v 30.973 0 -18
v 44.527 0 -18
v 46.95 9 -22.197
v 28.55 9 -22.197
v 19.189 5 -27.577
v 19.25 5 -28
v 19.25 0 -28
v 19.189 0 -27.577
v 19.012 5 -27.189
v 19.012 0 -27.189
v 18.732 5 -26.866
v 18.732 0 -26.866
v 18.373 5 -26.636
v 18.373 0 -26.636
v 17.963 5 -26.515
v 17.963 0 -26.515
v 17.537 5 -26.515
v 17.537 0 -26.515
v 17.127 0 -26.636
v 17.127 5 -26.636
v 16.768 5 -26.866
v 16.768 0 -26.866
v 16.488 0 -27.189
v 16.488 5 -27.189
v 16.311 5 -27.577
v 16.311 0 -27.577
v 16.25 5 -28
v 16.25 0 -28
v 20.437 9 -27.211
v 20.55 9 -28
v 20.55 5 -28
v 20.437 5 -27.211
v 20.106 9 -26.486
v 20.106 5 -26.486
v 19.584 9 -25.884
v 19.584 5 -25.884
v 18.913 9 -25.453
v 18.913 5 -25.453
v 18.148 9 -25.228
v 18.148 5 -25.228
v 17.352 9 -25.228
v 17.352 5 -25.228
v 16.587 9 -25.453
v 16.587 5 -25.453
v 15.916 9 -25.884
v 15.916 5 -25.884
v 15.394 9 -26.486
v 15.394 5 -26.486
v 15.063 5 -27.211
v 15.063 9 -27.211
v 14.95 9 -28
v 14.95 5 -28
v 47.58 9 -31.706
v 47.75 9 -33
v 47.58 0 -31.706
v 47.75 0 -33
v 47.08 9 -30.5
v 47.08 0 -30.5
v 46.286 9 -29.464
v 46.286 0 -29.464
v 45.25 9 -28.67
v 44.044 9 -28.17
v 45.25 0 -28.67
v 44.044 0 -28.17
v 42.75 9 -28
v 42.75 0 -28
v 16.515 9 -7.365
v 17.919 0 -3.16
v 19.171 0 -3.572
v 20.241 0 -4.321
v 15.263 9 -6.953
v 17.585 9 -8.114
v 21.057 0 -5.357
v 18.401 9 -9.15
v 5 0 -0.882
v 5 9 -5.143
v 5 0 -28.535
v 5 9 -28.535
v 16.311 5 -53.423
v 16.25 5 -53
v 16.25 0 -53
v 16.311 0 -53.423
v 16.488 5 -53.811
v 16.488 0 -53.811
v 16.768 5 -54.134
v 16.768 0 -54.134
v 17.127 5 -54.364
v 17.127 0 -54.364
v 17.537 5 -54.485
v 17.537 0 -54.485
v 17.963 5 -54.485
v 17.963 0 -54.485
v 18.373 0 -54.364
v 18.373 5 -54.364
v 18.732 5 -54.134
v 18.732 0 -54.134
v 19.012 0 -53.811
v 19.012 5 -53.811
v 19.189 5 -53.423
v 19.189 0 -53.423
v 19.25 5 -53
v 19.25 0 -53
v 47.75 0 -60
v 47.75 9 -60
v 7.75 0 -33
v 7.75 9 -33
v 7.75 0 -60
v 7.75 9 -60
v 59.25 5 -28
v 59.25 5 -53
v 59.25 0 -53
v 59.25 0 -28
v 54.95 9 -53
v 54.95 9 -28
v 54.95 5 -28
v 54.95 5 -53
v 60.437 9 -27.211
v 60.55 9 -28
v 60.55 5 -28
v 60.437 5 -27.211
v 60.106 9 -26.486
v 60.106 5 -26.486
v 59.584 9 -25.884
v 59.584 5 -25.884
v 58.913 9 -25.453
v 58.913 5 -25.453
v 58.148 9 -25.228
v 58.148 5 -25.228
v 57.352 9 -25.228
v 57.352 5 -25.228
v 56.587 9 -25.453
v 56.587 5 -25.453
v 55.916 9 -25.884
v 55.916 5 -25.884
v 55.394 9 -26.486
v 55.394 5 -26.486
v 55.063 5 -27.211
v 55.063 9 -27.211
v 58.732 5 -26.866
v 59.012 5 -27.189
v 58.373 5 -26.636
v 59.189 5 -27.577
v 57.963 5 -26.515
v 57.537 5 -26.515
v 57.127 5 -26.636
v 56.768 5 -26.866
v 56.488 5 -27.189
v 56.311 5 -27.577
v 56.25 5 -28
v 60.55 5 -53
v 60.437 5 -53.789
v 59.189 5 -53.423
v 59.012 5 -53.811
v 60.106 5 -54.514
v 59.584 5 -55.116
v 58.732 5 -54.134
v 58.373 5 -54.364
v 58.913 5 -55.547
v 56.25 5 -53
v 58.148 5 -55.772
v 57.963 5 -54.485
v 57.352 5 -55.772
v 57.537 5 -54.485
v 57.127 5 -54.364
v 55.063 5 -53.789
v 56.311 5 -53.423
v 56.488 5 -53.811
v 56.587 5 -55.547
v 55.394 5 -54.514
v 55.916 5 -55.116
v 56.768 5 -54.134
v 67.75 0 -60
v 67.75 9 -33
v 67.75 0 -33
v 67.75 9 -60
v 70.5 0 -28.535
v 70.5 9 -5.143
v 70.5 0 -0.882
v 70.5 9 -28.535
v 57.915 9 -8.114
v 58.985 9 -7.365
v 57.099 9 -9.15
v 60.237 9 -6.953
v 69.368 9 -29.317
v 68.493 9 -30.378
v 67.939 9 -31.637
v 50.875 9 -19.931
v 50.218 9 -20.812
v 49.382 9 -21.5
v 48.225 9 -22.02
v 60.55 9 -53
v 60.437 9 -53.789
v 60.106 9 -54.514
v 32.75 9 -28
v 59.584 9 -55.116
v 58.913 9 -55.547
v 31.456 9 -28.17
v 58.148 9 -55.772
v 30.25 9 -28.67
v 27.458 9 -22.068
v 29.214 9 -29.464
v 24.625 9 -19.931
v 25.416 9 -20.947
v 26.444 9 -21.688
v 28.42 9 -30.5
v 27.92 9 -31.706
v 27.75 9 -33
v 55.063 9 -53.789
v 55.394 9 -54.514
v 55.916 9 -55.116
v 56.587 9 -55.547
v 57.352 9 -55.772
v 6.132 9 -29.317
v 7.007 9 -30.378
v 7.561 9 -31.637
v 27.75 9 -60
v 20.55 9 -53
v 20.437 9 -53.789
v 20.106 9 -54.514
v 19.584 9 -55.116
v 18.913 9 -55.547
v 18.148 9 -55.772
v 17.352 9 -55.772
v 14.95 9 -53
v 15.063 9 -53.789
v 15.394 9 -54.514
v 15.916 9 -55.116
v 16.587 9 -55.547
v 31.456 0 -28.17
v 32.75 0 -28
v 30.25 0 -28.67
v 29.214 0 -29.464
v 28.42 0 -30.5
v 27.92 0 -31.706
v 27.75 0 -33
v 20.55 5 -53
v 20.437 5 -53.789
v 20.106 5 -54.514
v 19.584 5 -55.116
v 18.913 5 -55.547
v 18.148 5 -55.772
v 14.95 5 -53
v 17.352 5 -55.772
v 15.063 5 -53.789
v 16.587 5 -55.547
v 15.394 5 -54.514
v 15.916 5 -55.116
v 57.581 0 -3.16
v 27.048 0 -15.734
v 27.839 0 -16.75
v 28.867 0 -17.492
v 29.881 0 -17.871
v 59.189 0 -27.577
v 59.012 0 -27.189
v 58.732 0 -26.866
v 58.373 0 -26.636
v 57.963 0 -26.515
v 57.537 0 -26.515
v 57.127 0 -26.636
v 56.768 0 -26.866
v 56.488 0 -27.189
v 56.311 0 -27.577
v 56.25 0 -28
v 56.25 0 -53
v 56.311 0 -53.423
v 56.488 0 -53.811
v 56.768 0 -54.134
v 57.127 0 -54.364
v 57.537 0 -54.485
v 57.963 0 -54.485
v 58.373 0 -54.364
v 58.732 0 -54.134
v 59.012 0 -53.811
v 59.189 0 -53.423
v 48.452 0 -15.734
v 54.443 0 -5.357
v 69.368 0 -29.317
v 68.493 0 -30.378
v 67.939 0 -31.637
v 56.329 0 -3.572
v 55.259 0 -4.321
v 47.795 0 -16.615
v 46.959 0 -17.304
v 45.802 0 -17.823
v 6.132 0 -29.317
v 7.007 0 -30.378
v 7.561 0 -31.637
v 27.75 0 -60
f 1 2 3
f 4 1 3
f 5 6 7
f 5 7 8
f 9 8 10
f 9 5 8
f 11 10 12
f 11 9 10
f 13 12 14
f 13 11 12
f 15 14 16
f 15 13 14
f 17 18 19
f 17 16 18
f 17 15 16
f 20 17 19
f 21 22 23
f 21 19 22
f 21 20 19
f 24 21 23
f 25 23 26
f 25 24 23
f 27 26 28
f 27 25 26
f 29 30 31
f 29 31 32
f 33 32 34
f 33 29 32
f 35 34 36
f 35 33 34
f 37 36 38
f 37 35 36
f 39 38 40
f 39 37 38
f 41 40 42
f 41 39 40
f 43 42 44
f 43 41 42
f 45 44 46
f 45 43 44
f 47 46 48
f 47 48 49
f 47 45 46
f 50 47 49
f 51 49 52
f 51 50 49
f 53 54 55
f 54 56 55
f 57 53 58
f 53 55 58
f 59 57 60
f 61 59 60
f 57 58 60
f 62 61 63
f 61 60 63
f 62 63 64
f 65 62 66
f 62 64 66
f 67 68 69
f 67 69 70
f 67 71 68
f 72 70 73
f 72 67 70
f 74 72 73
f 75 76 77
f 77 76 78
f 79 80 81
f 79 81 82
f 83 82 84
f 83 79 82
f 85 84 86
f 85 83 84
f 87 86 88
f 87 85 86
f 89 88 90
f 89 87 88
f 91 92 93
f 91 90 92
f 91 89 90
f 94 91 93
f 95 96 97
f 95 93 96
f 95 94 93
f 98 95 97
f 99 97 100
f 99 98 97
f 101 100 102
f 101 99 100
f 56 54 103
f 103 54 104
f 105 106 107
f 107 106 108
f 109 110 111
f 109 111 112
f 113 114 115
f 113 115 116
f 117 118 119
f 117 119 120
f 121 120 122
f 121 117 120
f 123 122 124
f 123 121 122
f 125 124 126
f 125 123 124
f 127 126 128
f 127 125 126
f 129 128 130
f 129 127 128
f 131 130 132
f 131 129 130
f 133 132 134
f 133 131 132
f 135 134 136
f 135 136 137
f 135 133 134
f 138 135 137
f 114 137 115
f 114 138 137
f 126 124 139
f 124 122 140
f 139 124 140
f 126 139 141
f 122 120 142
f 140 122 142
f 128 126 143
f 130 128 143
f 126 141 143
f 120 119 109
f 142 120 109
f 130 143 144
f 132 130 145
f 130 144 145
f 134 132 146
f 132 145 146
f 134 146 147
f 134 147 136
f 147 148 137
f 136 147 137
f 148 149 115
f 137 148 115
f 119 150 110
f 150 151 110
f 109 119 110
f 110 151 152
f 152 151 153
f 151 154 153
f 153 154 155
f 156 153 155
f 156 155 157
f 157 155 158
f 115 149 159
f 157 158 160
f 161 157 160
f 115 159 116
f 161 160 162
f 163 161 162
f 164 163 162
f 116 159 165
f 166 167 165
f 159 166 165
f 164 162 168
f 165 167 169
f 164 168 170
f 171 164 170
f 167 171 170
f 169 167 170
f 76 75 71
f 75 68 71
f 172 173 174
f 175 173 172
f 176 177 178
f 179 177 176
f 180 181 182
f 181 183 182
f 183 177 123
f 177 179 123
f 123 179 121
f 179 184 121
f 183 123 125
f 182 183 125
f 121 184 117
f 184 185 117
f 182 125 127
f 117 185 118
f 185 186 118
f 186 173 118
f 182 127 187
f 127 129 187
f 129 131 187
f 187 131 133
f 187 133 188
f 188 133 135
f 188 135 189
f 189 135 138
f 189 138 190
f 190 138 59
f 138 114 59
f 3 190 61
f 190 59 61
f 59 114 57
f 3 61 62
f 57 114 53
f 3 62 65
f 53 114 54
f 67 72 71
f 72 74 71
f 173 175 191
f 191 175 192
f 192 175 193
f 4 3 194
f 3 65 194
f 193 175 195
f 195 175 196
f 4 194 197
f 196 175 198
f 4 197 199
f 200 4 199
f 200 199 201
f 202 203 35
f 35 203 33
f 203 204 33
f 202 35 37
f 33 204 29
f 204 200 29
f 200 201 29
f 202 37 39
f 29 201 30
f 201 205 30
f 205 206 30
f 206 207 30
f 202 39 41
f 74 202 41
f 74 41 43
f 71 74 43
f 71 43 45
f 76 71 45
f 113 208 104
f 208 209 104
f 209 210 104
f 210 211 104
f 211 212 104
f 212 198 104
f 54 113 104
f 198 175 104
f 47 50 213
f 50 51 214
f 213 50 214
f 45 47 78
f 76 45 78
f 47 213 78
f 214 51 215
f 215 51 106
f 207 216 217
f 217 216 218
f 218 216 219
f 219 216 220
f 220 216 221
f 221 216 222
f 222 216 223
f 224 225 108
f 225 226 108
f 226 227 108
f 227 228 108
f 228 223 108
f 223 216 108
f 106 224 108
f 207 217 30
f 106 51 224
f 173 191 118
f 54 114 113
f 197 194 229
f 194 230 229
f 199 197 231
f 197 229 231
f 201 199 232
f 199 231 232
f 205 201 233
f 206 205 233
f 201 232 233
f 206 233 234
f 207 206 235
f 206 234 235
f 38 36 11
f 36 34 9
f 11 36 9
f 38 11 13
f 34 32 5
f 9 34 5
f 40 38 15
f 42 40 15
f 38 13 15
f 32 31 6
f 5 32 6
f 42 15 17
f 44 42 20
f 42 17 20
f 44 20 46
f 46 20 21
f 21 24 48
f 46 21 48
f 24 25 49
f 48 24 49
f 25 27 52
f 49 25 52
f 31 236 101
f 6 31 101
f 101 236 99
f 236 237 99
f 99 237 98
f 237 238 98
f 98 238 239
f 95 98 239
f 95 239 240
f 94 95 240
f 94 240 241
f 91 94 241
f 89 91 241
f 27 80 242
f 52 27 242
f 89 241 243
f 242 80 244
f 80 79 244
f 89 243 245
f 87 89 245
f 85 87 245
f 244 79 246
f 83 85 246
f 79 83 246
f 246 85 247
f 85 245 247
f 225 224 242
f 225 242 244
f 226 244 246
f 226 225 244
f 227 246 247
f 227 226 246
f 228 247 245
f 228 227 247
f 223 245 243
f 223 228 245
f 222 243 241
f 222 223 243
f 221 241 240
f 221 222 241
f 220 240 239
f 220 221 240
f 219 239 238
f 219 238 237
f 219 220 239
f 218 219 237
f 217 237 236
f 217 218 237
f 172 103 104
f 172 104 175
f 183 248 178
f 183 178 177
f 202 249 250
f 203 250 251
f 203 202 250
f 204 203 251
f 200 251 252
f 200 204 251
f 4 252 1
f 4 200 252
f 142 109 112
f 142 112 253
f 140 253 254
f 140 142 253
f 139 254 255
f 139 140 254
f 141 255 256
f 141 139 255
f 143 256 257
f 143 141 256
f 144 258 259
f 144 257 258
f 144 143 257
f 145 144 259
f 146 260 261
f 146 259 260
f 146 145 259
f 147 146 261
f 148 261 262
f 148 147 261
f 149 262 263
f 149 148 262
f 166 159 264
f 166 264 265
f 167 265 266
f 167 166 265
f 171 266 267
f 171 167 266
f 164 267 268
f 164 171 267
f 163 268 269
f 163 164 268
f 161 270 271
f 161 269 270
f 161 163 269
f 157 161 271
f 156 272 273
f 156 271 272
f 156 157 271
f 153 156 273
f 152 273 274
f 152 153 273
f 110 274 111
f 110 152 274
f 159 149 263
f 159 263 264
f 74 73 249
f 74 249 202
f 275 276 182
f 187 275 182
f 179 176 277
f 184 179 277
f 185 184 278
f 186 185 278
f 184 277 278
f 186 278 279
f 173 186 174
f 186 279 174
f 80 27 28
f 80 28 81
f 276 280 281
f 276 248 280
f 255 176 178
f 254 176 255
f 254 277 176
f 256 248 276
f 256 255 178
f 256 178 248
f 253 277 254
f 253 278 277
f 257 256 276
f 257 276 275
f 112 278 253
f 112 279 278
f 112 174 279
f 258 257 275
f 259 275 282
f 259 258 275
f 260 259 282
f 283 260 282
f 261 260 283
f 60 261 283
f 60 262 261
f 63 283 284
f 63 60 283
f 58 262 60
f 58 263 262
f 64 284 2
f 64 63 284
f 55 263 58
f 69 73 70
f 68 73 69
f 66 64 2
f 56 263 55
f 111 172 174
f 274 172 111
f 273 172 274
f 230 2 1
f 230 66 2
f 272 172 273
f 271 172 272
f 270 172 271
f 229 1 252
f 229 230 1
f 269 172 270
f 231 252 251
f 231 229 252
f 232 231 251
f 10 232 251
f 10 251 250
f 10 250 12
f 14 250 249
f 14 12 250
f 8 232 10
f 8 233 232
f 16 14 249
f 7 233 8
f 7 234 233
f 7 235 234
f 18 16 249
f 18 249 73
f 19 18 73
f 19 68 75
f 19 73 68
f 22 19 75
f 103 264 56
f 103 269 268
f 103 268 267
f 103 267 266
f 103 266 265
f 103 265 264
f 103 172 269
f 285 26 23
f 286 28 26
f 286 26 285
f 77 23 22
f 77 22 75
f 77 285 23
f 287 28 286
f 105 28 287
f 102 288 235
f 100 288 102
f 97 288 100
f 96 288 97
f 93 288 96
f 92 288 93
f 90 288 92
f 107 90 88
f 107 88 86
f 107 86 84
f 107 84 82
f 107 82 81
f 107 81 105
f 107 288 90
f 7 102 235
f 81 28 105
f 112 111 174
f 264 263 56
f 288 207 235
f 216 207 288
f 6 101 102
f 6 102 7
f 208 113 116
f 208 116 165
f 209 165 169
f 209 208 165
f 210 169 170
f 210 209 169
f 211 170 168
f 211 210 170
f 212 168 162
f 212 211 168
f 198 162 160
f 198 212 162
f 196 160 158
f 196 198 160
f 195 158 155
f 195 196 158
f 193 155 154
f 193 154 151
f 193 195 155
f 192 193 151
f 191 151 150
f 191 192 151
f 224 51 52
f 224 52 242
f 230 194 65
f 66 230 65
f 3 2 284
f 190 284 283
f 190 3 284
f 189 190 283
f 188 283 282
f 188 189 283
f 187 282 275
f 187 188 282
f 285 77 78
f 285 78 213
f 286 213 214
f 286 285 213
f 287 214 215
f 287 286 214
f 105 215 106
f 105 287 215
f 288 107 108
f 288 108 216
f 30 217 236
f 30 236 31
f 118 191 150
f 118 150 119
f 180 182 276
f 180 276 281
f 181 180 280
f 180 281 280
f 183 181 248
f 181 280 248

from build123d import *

# Parameters (mm, degrees)
BOSS_EXTRUDE1_DEPTH = 9
CUT_EXTRUDE2_REACH  = 98.857
SKETCH5_W           = 20
SKETCH5_H           = 32
SKETCH5_W_2         = 7.75
CUT_EXTRUDE3_DEPTH  = 10
FILLET1_R           = 5
CUT_EXTRUDE4_DEPTH  = 4
FILLET2_R           = 5
CUT_EXTRUDE5_REACH  = 98.857
SKETCH7_W           = 5
SKETCH7_H           = 33.085129134
SKETCH7_H_2         = 33.745309592


with BuildPart() as part:
    # Sketch1 → Boss-Extrude1 (new body)
    with BuildSketch(Plane(origin=(0, 0, 0), x_dir=(1, 0, 0), z_dir=(0, 1, 0))):
        Polygon((0, 0), (0, 60), (75.5, 60), (75.5, 0), (55.5, 3.526539614), (47.14374375, 18), (28.35625625, 18), (20, 3.526539614), align=None)
    extrude(amount=BOSS_EXTRUDE1_DEPTH)

    # Sketch4 → Cut-Extrude2 (cut, up to next)
    with BuildSketch(Plane(origin=(0, 9, 0), x_dir=(1, 0, 0), z_dir=(0, 1, 0)), mode=Mode.PRIVATE) as cut_extrude2_sk1:
        with BuildLine():
            Line((19.25, 53), (19.25, 28))
            ThreePointArc((19.25, 28), (17.75, 26.5), (16.25, 28))
            Line((16.25, 28), (16.25, 53))
            ThreePointArc((16.25, 53), (17.75, 54.5), (19.25, 53))
        make_face()
    cut_extrude2_tool1 = extrude(cut_extrude2_sk1.sketch, amount=-CUT_EXTRUDE2_REACH, mode=Mode.PRIVATE) & part.part
    # Sketch4 → Cut-Extrude2 (cut, up to next)
    with BuildSketch(Plane(origin=(0, 9, 0), x_dir=(1, 0, 0), z_dir=(0, 1, 0)), mode=Mode.PRIVATE) as cut_extrude2_sk2:
        with BuildLine():
            Line((59.25, 53), (59.25, 28))
            ThreePointArc((59.25, 28), (57.75, 26.5), (56.25, 28))
            Line((56.25, 28), (56.25, 53))
            ThreePointArc((56.25, 53), (57.75, 54.5), (59.25, 53))
        make_face()
    cut_extrude2_tool2 = extrude(cut_extrude2_sk2.sketch, amount=-CUT_EXTRUDE2_REACH, mode=Mode.PRIVATE) & part.part
    add(cut_extrude2_tool1.solids().sort_by_distance((17.75, 9, -40.5))[0], mode=Mode.SUBTRACT)
    add(cut_extrude2_tool2.solids().sort_by_distance((57.75, 9, -40.5))[0], mode=Mode.SUBTRACT)

    # Sketch5 → Cut-Extrude3 (cut)
    with BuildSketch(Plane(origin=(0, 9, 0), x_dir=(1, 0, 0), z_dir=(0, 1, 0))):
        with Locations((37.75, 44)):
            Rectangle(SKETCH5_W, SKETCH5_H)
        with Locations((71.625, 44)):
            Rectangle(SKETCH5_W_2, SKETCH5_H)
        with Locations((3.875, 44)):
            Rectangle(SKETCH5_W_2, SKETCH5_H)
    extrude(amount=-CUT_EXTRUDE3_DEPTH, mode=Mode.SUBTRACT)

    # Fillet1
    fillet1_edges = [part.edges().sort_by_distance(p)[0] for p in [
        (27.75, 4.5, -28),
        (47.75, 4.5, -28),
        (7.75, 4.5, -28),
        (67.75, 4.5, -28),
    ]]
    fillet(fillet1_edges, radius=FILLET1_R)

    # Sketch6 → Cut-Extrude4 (cut)
    with BuildSketch(Plane(origin=(0, 9, 0), x_dir=(1, 0, 0), z_dir=(0, 1, 0))):
        with BuildLine():
            Line((20.55, 53), (20.55, 28))
            ThreePointArc((20.55, 28), (17.75, 25.2), (14.95, 28))
            Line((14.95, 28), (14.95, 53))
            ThreePointArc((14.95, 53), (17.75, 55.8), (20.55, 53))
        make_face()
        with BuildLine():
            Line((60.55, 53), (60.55, 28))
            ThreePointArc((60.55, 28), (57.75, 25.2), (54.95, 28))
            Line((54.95, 28), (54.95, 53))
            ThreePointArc((54.95, 53), (57.75, 55.8), (60.55, 53))
        make_face()
    extrude(amount=-CUT_EXTRUDE4_DEPTH, mode=Mode.SUBTRACT)

    # Chamfer1
    # the kernel refuses this chamfer: 9, 4.196768923 mm, written as the material it takes off along each edge
    with BuildSketch(Plane(origin=(98.464514589, 9, 4.049263521), x_dir=(-0.002832403926993569, -0.9998669641130703, 0.016063360896972027), z_dir=(-0.9848077530122074, 0, -0.17364817766693463))) as chamfer1_piece_1_section:
        with BuildLine():
            Line((9.327511697, 0), (-0.397163207, -4.34301108))
            Line((-0.397163207, -4.34301108), (-0.57713926, -4.34007507))
            ThreePointArc((-0.57713926, -4.34007507), (-0.215443958, -2.171230459), (-0.179976054, 0.00293601))
            Line((-0.179976054, 0.00293601), (0.00293601, 0.179976054))
            ThreePointArc((0.00293601, 0.179976054), (4.665451047, 0.103914887), (9.330447707, 0.179976054))
            Line((9.330447707, 0.179976054), (9.327511697, 0))
        make_face()
    chamfer1_piece_1 = extrude(amount=66.946090723, mode=Mode.PRIVATE)
    chamfer1_piece_1 = split(chamfer1_piece_1, bisect_by=Plane(origin=(75.5, 5.998922667, -3.223017073), z_dir=(-1, 0, 0)), keep=Keep.TOP, mode=Mode.PRIVATE)
    chamfer1_piece_1 = split(chamfer1_piece_1, bisect_by=Plane(origin=(58.020430992, 5.998922667, 0.83897492), z_dir=(0.8660254037844379, 0, -0.5000000000000017)), keep=Keep.TOP, mode=Mode.PRIVATE)
    add(chamfer1_piece_1, mode=Mode.SUBTRACT)
    with BuildSketch(Plane(origin=(42.964514589, 9, -7.575803135), x_dir=(0.002832403926993593, -0.9998669641130703, 0.01606336089697216), z_dir=(-0.9848077530122074, 0, 0.1736481776669347))) as chamfer1_piece_2_section:
        with BuildLine():
            Line((9.327511697, 0), (-0.397163207, -4.34301108))
            Line((-0.397163207, -4.34301108), (-0.57713926, -4.34007507))
            ThreePointArc((-0.57713926, -4.34007507), (-0.215443958, -2.171230459), (-0.179976054, 0.00293601))
            Line((-0.179976054, 0.00293601), (0.00293601, 0.179976054))
            ThreePointArc((0.00293601, 0.179976054), (4.665451047, 0.103914887), (9.330447707, 0.179976054))
            Line((9.330447707, 0.179976054), (9.327511697, 0))
        make_face()
    chamfer1_piece_2 = extrude(amount=66.946090723, mode=Mode.PRIVATE)
    chamfer1_piece_2 = split(chamfer1_piece_2, bisect_by=Plane(origin=(17.479569008, 5.998922667, 0.83897492), z_dir=(-0.8660254037844382, 0, -0.500000000000001)), keep=Keep.TOP, mode=Mode.PRIVATE)
    chamfer1_piece_2 = split(chamfer1_piece_2, bisect_by=Plane(origin=(0, 5.998922667, -3.223017073), z_dir=(1, 0, 0)), keep=Keep.TOP, mode=Mode.PRIVATE)
    add(chamfer1_piece_2, mode=Mode.SUBTRACT)
    with BuildSketch(Plane(origin=(67.159389621, 9, 16.668115595), x_dir=(-0.014125882502839455, -0.9998669641130703, 0.008155582065555418), z_dir=(-0.5000000000000017, 0, -0.8660254037844378))) as chamfer1_piece_3_section:
        with BuildLine():
            Line((9.327511697, 0), (-0.397163207, -4.34301108))
            Line((-0.397163207, -4.34301108), (-0.57713926, -4.34007507))
            ThreePointArc((-0.57713926, -4.34007507), (-0.215443958, -2.171230459), (-0.179976054, 0.00293601))
            Line((-0.179976054, 0.00293601), (0.00293601, 0.179976054))
            ThreePointArc((0.00293601, 0.179976054), (4.665451047, 0.103914887), (9.330447707, 0.179976054))
            Line((9.330447707, 0.179976054), (9.327511697, 0))
        make_face()
    chamfer1_piece_3 = extrude(amount=63.350070985, mode=Mode.PRIVATE)
    chamfer1_piece_3 = split(chamfer1_piece_3, bisect_by=Plane(origin=(51.823877601, 5.976991007, -4.174739178), z_dir=(0.17364817766693463, 0, -0.9848077530122074)), keep=Keep.TOP, mode=Mode.PRIVATE)
    chamfer1_piece_3 = split(chamfer1_piece_3, bisect_by=Plane(origin=(52.958801504, 5.976991007, -18), z_dir=(0, 0, 1)), keep=Keep.TOP, mode=Mode.PRIVATE)
    add(chamfer1_piece_3, mode=Mode.SUBTRACT)
    with BuildSketch(Plane(origin=(70.462522993, 9, -18), x_dir=(0, -0.9998669641130703, 0.01631116413111029), z_dir=(-1, 0, 0))) as chamfer1_piece_4_section:
        with BuildLine():
            Line((9.327511697, 0), (-0.397163207, -4.34301108))
            Line((-0.397163207, -4.34301108), (-0.57713926, -4.34007507))
            ThreePointArc((-0.57713926, -4.34007507), (-0.215443958, -2.171230459), (-0.179976054, 0.00293601))
            Line((-0.179976054, 0.00293601), (0.00293601, 0.179976054))
            ThreePointArc((0.00293601, 0.179976054), (4.665451047, 0.103914887), (9.330447707, 0.179976054))
            Line((9.330447707, 0.179976054), (9.327511697, 0))
        make_face()
    chamfer1_piece_4 = extrude(amount=65.425045986, mode=Mode.PRIVATE)
    chamfer1_piece_4 = split(chamfer1_piece_4, bisect_by=Plane(origin=(44.256558159, 5.863829833, -23.000752134), z_dir=(-0.8660254037844379, 0, 0.5000000000000017)), keep=Keep.TOP, mode=Mode.PRIVATE)
    chamfer1_piece_4 = split(chamfer1_piece_4, bisect_by=Plane(origin=(31.243441841, 5.863829833, -23.000752134), z_dir=(0.8660254037844382, 0, 0.500000000000001)), keep=Keep.TOP, mode=Mode.PRIVATE)
    add(chamfer1_piece_4, mode=Mode.SUBTRACT)
    with BuildSketch(Plane(origin=(40.015645871, 9, -38.19465521), x_dir=(0.014125882502839221, -0.9998669641130703, 0.00815558206555527), z_dir=(-0.5000000000000009, 0, 0.866025403784438))) as chamfer1_piece_5_section:
        with BuildLine():
            Line((9.327511697, 0), (-0.397163207, -4.34301108))
            Line((-0.397163207, -4.34301108), (-0.57713926, -4.34007507))
            ThreePointArc((-0.57713926, -4.34007507), (-0.215443958, -2.171230459), (-0.179976054, 0.00293601))
            Line((-0.179976054, 0.00293601), (0.00293601, 0.179976054))
            ThreePointArc((0.00293601, 0.179976054), (4.665451047, 0.103914887), (9.330447707, 0.179976054))
            Line((9.330447707, 0.179976054), (9.327511697, 0))
        make_face()
    chamfer1_piece_5 = extrude(amount=63.350070985, mode=Mode.PRIVATE)
    chamfer1_piece_5 = split(chamfer1_piece_5, bisect_by=Plane(origin=(22.541198496, 5.976991007, -18), z_dir=(0, 0, 1)), keep=Keep.TOP, mode=Mode.PRIVATE)
    chamfer1_piece_5 = split(chamfer1_piece_5, bisect_by=Plane(origin=(23.676122399, 5.976991007, -4.174739178), z_dir=(-0.1736481776669347, 0, -0.9848077530122074)), keep=Keep.TOP, mode=Mode.PRIVATE)
    add(chamfer1_piece_5, mode=Mode.SUBTRACT)
    with BuildSketch(Plane(origin=(98.464514589, 9, 4.049263521), x_dir=(-0.002832403926993569, -0.9998669641130703, 0.016063360896972027), z_dir=(-0.9848077530122074, 0, -0.17364817766693463))) as chamfer1_piece_6a_section:
        with BuildLine():
            Line((9.327511697, 0), (-0.397163207, -4.34301108))
            Line((-0.397163207, -4.34301108), (-0.57713926, -4.34007507))
            ThreePointArc((-0.57713926, -4.34007507), (-0.215443958, -2.171230459), (-0.179976054, 0.00293601))
            Line((-0.179976054, 0.00293601), (0.00293601, 0.179976054))
            ThreePointArc((0.00293601, 0.179976054), (4.665451047, 0.103914887), (9.330447707, 0.179976054))
            Line((9.330447707, 0.179976054), (9.327511697, 0))
        make_face()
    chamfer1_piece_6a = extrude(amount=66.946090723, mode=Mode.PRIVATE)
    chamfer1_piece_6a = split(chamfer1_piece_6a, bisect_by=Plane(origin=(51.090565692, 5.903894994, -11.163903869), z_dir=(-0.8660254037844379, 0, 0.5000000000000017)), keep=Keep.TOP, mode=Mode.PRIVATE)
    with BuildSketch(Plane(origin=(67.159389621, 9, 16.668115595), x_dir=(-0.014125882502839455, -0.9998669641130703, 0.008155582065555418), z_dir=(-0.5000000000000017, 0, -0.8660254037844378))) as chamfer1_piece_6b_section:
        with BuildLine():
            Line((9.327511697, 0), (-0.397163207, -4.34301108))
            Line((-0.397163207, -4.34301108), (-0.57713926, -4.34007507))
            ThreePointArc((-0.57713926, -4.34007507), (-0.215443958, -2.171230459), (-0.179976054, 0.00293601))
            Line((-0.179976054, 0.00293601), (0.00293601, 0.179976054))
            ThreePointArc((0.00293601, 0.179976054), (4.665451047, 0.103914887), (9.330447707, 0.179976054))
            Line((9.330447707, 0.179976054), (9.327511697, 0))
        make_face()
    chamfer1_piece_6b = extrude(amount=63.350070985, mode=Mode.PRIVATE)
    chamfer1_piece_6b = split(chamfer1_piece_6b, bisect_by=Plane(origin=(64.184890186, 5.903894994, -1.99515915), z_dir=(-0.17364817766693463, 0, 0.9848077530122074)), keep=Keep.TOP, mode=Mode.PRIVATE)
    chamfer1_piece_6 = chamfer1_piece_6a & chamfer1_piece_6b
    add(chamfer1_piece_6, mode=Mode.SUBTRACT)
    with BuildSketch(Plane(origin=(40.015645871, 9, -38.19465521), x_dir=(0.014125882502839221, -0.9998669641130703, 0.00815558206555527), z_dir=(-0.5000000000000009, 0, 0.866025403784438))) as chamfer1_piece_7a_section:
        with BuildLine():
            Line((9.327511697, 0), (-0.397163207, -4.34301108))
            Line((-0.397163207, -4.34301108), (-0.57713926, -4.34007507))
            ThreePointArc((-0.57713926, -4.34007507), (-0.215443958, -2.171230459), (-0.179976054, 0.00293601))
            Line((-0.179976054, 0.00293601), (0.00293601, 0.179976054))
            ThreePointArc((0.00293601, 0.179976054), (4.665451047, 0.103914887), (9.330447707, 0.179976054))
            Line((9.330447707, 0.179976054), (9.327511697, 0))
        make_face()
    chamfer1_piece_7a = extrude(amount=63.350070985, mode=Mode.PRIVATE)
    chamfer1_piece_7a = split(chamfer1_piece_7a, bisect_by=Plane(origin=(11.315109814, 5.903894994, -1.99515915), z_dir=(0.1736481776669347, 0, 0.9848077530122074)), keep=Keep.TOP, mode=Mode.PRIVATE)
    with BuildSketch(Plane(origin=(42.964514589, 9, -7.575803135), x_dir=(0.002832403926993593, -0.9998669641130703, 0.01606336089697216), z_dir=(-0.9848077530122074, 0, 0.1736481776669347))) as chamfer1_piece_7b_section:
        with BuildLine():
            Line((9.327511697, 0), (-0.397163207, -4.34301108))
            Line((-0.397163207, -4.34301108), (-0.57713926, -4.34007507))
            ThreePointArc((-0.57713926, -4.34007507), (-0.215443958, -2.171230459), (-0.179976054, 0.00293601))
            Line((-0.179976054, 0.00293601), (0.00293601, 0.179976054))
            ThreePointArc((0.00293601, 0.179976054), (4.665451047, 0.103914887), (9.330447707, 0.179976054))
            Line((9.330447707, 0.179976054), (9.327511697, 0))
        make_face()
    chamfer1_piece_7b = extrude(amount=66.946090723, mode=Mode.PRIVATE)
    chamfer1_piece_7b = split(chamfer1_piece_7b, bisect_by=Plane(origin=(24.409434308, 5.903894994, -11.163903869), z_dir=(0.8660254037844382, 0, 0.500000000000001)), keep=Keep.TOP, mode=Mode.PRIVATE)
    chamfer1_piece_7 = chamfer1_piece_7a & chamfer1_piece_7b
    add(chamfer1_piece_7, mode=Mode.SUBTRACT)
    with BuildSketch(Plane(origin=(67.159389621, 9, 16.668115595), x_dir=(-0.014125882502839455, -0.9998669641130703, 0.008155582065555418), z_dir=(-0.5000000000000017, 0, -0.8660254037844378))) as chamfer1_piece_8a_section:
        with BuildLine():
            Line((9.327511697, 0), (-0.397163207, -4.34301108))
            Line((-0.397163207, -4.34301108), (-0.57713926, -4.34007507))
            ThreePointArc((-0.57713926, -4.34007507), (-0.215443958, -2.171230459), (-0.179976054, 0.00293601))
            Line((-0.179976054, 0.00293601), (0.00293601, 0.179976054))
            ThreePointArc((0.00293601, 0.179976054), (4.665451047, 0.103914887), (9.330447707, 0.179976054))
            Line((9.330447707, 0.179976054), (9.327511697, 0))
        make_face()
    chamfer1_piece_8a = extrude(amount=63.350070985, mode=Mode.PRIVATE)
    chamfer1_piece_8a = split(chamfer1_piece_8a, bisect_by=Plane(origin=(42.679871827, 5.988864312, -18), z_dir=(0, 0, -1)), keep=Keep.TOP, mode=Mode.PRIVATE)
    with BuildSketch(Plane(origin=(70.462522993, 9, -18), x_dir=(0, -0.9998669641130703, 0.01631116413111029), z_dir=(-1, 0, 0))) as chamfer1_piece_8b_section:
        with BuildLine():
            Line((9.327511697, 0), (-0.397163207, -4.34301108))
            Line((-0.397163207, -4.34301108), (-0.57713926, -4.34007507))
            ThreePointArc((-0.57713926, -4.34007507), (-0.215443958, -2.171230459), (-0.179976054, 0.00293601))
            Line((-0.179976054, 0.00293601), (0.00293601, 0.179976054))
            ThreePointArc((0.00293601, 0.179976054), (4.665451047, 0.103914887), (9.330447707, 0.179976054))
            Line((9.330447707, 0.179976054), (9.327511697, 0))
        make_face()
    chamfer1_piece_8b = extrude(amount=65.425045986, mode=Mode.PRIVATE)
    chamfer1_piece_8b = split(chamfer1_piece_8b, bisect_by=Plane(origin=(49.375679712, 5.988864312, -14.134173515), z_dir=(0.8660254037844379, 0, -0.5000000000000017)), keep=Keep.TOP, mode=Mode.PRIVATE)
    chamfer1_piece_8 = chamfer1_piece_8a & chamfer1_piece_8b
    add(chamfer1_piece_8, mode=Mode.SUBTRACT)
    with BuildSketch(Plane(origin=(70.462522993, 9, -18), x_dir=(0, -0.9998669641130703, 0.01631116413111029), z_dir=(-1, 0, 0))) as chamfer1_piece_9a_section:
        with BuildLine():
            Line((9.327511697, 0), (-0.397163207, -4.34301108))
            Line((-0.397163207, -4.34301108), (-0.57713926, -4.34007507))
            ThreePointArc((-0.57713926, -4.34007507), (-0.215443958, -2.171230459), (-0.179976054, 0.00293601))
            Line((-0.179976054, 0.00293601), (0.00293601, 0.179976054))
            ThreePointArc((0.00293601, 0.179976054), (4.665451047, 0.103914887), (9.330447707, 0.179976054))
            Line((9.330447707, 0.179976054), (9.327511697, 0))
        make_face()
    chamfer1_piece_9a = extrude(amount=65.425045986, mode=Mode.PRIVATE)
    chamfer1_piece_9a = split(chamfer1_piece_9a, bisect_by=Plane(origin=(26.124320288, 5.988864312, -14.134173515), z_dir=(-0.8660254037844382, 0, -0.500000000000001)), keep=Keep.TOP, mode=Mode.PRIVATE)
    with BuildSketch(Plane(origin=(40.015645871, 9, -38.19465521), x_dir=(0.014125882502839221, -0.9998669641130703, 0.00815558206555527), z_dir=(-0.5000000000000009, 0, 0.866025403784438))) as chamfer1_piece_9b_section:
        with BuildLine():
            Line((9.327511697, 0), (-0.397163207, -4.34301108))
            Line((-0.397163207, -4.34301108), (-0.57713926, -4.34007507))
            ThreePointArc((-0.57713926, -4.34007507), (-0.215443958, -2.171230459), (-0.179976054, 0.00293601))
            Line((-0.179976054, 0.00293601), (0.00293601, 0.179976054))
            ThreePointArc((0.00293601, 0.179976054), (4.665451047, 0.103914887), (9.330447707, 0.179976054))
            Line((9.330447707, 0.179976054), (9.327511697, 0))
        make_face()
    chamfer1_piece_9b = extrude(amount=63.350070985, mode=Mode.PRIVATE)
    chamfer1_piece_9b = split(chamfer1_piece_9b, bisect_by=Plane(origin=(32.820128173, 5.988864312, -18), z_dir=(0, 0, -1)), keep=Keep.TOP, mode=Mode.PRIVATE)
    chamfer1_piece_9 = chamfer1_piece_9a & chamfer1_piece_9b
    add(chamfer1_piece_9, mode=Mode.SUBTRACT)

    # Fillet2
    fillet2_edges = [part.edges().sort_by_distance(p)[0] for p in [
        (18.671992121, 4.5, -5.423131419),
        (27.144753416, 4.5, -20.098384462),
        (48.355246584, 4.5, -20.098384462),
        (56.828007879, 4.5, -5.423131419),
    ]]
    fillet(fillet2_edges, radius=FILLET2_R)

    # Sketch7 → Cut-Extrude5 (cut, up to next)
    with BuildSketch(Plane(origin=(0, 9, 0), x_dir=(1, 0, 0), z_dir=(0, 1, 0)), mode=Mode.PRIVATE) as cut_extrude5_sk1:
        with Locations((2.5, 16.542564567)):
            Rectangle(SKETCH7_W, SKETCH7_H)
    cut_extrude5_tool1 = extrude(cut_extrude5_sk1.sketch, amount=-CUT_EXTRUDE5_REACH, mode=Mode.PRIVATE) & part.part
    # Sketch7 → Cut-Extrude5 (cut, up to next)
    with BuildSketch(Plane(origin=(0, 9, 0), x_dir=(1, 0, 0), z_dir=(0, 1, 0)), mode=Mode.PRIVATE) as cut_extrude5_sk2:
        with Locations((73, 16.872654796)):
            Rectangle(SKETCH7_W, SKETCH7_H_2)
    cut_extrude5_tool2 = extrude(cut_extrude5_sk2.sketch, amount=-CUT_EXTRUDE5_REACH, mode=Mode.PRIVATE) & part.part
    add(cut_extrude5_tool1.solids().sort_by_distance((2.5, 9, -16.542565))[0], mode=Mode.SUBTRACT)
    add(cut_extrude5_tool2.solids().sort_by_distance((73, 9, -16.872655))[0], mode=Mode.SUBTRACT)


solid = part.part
